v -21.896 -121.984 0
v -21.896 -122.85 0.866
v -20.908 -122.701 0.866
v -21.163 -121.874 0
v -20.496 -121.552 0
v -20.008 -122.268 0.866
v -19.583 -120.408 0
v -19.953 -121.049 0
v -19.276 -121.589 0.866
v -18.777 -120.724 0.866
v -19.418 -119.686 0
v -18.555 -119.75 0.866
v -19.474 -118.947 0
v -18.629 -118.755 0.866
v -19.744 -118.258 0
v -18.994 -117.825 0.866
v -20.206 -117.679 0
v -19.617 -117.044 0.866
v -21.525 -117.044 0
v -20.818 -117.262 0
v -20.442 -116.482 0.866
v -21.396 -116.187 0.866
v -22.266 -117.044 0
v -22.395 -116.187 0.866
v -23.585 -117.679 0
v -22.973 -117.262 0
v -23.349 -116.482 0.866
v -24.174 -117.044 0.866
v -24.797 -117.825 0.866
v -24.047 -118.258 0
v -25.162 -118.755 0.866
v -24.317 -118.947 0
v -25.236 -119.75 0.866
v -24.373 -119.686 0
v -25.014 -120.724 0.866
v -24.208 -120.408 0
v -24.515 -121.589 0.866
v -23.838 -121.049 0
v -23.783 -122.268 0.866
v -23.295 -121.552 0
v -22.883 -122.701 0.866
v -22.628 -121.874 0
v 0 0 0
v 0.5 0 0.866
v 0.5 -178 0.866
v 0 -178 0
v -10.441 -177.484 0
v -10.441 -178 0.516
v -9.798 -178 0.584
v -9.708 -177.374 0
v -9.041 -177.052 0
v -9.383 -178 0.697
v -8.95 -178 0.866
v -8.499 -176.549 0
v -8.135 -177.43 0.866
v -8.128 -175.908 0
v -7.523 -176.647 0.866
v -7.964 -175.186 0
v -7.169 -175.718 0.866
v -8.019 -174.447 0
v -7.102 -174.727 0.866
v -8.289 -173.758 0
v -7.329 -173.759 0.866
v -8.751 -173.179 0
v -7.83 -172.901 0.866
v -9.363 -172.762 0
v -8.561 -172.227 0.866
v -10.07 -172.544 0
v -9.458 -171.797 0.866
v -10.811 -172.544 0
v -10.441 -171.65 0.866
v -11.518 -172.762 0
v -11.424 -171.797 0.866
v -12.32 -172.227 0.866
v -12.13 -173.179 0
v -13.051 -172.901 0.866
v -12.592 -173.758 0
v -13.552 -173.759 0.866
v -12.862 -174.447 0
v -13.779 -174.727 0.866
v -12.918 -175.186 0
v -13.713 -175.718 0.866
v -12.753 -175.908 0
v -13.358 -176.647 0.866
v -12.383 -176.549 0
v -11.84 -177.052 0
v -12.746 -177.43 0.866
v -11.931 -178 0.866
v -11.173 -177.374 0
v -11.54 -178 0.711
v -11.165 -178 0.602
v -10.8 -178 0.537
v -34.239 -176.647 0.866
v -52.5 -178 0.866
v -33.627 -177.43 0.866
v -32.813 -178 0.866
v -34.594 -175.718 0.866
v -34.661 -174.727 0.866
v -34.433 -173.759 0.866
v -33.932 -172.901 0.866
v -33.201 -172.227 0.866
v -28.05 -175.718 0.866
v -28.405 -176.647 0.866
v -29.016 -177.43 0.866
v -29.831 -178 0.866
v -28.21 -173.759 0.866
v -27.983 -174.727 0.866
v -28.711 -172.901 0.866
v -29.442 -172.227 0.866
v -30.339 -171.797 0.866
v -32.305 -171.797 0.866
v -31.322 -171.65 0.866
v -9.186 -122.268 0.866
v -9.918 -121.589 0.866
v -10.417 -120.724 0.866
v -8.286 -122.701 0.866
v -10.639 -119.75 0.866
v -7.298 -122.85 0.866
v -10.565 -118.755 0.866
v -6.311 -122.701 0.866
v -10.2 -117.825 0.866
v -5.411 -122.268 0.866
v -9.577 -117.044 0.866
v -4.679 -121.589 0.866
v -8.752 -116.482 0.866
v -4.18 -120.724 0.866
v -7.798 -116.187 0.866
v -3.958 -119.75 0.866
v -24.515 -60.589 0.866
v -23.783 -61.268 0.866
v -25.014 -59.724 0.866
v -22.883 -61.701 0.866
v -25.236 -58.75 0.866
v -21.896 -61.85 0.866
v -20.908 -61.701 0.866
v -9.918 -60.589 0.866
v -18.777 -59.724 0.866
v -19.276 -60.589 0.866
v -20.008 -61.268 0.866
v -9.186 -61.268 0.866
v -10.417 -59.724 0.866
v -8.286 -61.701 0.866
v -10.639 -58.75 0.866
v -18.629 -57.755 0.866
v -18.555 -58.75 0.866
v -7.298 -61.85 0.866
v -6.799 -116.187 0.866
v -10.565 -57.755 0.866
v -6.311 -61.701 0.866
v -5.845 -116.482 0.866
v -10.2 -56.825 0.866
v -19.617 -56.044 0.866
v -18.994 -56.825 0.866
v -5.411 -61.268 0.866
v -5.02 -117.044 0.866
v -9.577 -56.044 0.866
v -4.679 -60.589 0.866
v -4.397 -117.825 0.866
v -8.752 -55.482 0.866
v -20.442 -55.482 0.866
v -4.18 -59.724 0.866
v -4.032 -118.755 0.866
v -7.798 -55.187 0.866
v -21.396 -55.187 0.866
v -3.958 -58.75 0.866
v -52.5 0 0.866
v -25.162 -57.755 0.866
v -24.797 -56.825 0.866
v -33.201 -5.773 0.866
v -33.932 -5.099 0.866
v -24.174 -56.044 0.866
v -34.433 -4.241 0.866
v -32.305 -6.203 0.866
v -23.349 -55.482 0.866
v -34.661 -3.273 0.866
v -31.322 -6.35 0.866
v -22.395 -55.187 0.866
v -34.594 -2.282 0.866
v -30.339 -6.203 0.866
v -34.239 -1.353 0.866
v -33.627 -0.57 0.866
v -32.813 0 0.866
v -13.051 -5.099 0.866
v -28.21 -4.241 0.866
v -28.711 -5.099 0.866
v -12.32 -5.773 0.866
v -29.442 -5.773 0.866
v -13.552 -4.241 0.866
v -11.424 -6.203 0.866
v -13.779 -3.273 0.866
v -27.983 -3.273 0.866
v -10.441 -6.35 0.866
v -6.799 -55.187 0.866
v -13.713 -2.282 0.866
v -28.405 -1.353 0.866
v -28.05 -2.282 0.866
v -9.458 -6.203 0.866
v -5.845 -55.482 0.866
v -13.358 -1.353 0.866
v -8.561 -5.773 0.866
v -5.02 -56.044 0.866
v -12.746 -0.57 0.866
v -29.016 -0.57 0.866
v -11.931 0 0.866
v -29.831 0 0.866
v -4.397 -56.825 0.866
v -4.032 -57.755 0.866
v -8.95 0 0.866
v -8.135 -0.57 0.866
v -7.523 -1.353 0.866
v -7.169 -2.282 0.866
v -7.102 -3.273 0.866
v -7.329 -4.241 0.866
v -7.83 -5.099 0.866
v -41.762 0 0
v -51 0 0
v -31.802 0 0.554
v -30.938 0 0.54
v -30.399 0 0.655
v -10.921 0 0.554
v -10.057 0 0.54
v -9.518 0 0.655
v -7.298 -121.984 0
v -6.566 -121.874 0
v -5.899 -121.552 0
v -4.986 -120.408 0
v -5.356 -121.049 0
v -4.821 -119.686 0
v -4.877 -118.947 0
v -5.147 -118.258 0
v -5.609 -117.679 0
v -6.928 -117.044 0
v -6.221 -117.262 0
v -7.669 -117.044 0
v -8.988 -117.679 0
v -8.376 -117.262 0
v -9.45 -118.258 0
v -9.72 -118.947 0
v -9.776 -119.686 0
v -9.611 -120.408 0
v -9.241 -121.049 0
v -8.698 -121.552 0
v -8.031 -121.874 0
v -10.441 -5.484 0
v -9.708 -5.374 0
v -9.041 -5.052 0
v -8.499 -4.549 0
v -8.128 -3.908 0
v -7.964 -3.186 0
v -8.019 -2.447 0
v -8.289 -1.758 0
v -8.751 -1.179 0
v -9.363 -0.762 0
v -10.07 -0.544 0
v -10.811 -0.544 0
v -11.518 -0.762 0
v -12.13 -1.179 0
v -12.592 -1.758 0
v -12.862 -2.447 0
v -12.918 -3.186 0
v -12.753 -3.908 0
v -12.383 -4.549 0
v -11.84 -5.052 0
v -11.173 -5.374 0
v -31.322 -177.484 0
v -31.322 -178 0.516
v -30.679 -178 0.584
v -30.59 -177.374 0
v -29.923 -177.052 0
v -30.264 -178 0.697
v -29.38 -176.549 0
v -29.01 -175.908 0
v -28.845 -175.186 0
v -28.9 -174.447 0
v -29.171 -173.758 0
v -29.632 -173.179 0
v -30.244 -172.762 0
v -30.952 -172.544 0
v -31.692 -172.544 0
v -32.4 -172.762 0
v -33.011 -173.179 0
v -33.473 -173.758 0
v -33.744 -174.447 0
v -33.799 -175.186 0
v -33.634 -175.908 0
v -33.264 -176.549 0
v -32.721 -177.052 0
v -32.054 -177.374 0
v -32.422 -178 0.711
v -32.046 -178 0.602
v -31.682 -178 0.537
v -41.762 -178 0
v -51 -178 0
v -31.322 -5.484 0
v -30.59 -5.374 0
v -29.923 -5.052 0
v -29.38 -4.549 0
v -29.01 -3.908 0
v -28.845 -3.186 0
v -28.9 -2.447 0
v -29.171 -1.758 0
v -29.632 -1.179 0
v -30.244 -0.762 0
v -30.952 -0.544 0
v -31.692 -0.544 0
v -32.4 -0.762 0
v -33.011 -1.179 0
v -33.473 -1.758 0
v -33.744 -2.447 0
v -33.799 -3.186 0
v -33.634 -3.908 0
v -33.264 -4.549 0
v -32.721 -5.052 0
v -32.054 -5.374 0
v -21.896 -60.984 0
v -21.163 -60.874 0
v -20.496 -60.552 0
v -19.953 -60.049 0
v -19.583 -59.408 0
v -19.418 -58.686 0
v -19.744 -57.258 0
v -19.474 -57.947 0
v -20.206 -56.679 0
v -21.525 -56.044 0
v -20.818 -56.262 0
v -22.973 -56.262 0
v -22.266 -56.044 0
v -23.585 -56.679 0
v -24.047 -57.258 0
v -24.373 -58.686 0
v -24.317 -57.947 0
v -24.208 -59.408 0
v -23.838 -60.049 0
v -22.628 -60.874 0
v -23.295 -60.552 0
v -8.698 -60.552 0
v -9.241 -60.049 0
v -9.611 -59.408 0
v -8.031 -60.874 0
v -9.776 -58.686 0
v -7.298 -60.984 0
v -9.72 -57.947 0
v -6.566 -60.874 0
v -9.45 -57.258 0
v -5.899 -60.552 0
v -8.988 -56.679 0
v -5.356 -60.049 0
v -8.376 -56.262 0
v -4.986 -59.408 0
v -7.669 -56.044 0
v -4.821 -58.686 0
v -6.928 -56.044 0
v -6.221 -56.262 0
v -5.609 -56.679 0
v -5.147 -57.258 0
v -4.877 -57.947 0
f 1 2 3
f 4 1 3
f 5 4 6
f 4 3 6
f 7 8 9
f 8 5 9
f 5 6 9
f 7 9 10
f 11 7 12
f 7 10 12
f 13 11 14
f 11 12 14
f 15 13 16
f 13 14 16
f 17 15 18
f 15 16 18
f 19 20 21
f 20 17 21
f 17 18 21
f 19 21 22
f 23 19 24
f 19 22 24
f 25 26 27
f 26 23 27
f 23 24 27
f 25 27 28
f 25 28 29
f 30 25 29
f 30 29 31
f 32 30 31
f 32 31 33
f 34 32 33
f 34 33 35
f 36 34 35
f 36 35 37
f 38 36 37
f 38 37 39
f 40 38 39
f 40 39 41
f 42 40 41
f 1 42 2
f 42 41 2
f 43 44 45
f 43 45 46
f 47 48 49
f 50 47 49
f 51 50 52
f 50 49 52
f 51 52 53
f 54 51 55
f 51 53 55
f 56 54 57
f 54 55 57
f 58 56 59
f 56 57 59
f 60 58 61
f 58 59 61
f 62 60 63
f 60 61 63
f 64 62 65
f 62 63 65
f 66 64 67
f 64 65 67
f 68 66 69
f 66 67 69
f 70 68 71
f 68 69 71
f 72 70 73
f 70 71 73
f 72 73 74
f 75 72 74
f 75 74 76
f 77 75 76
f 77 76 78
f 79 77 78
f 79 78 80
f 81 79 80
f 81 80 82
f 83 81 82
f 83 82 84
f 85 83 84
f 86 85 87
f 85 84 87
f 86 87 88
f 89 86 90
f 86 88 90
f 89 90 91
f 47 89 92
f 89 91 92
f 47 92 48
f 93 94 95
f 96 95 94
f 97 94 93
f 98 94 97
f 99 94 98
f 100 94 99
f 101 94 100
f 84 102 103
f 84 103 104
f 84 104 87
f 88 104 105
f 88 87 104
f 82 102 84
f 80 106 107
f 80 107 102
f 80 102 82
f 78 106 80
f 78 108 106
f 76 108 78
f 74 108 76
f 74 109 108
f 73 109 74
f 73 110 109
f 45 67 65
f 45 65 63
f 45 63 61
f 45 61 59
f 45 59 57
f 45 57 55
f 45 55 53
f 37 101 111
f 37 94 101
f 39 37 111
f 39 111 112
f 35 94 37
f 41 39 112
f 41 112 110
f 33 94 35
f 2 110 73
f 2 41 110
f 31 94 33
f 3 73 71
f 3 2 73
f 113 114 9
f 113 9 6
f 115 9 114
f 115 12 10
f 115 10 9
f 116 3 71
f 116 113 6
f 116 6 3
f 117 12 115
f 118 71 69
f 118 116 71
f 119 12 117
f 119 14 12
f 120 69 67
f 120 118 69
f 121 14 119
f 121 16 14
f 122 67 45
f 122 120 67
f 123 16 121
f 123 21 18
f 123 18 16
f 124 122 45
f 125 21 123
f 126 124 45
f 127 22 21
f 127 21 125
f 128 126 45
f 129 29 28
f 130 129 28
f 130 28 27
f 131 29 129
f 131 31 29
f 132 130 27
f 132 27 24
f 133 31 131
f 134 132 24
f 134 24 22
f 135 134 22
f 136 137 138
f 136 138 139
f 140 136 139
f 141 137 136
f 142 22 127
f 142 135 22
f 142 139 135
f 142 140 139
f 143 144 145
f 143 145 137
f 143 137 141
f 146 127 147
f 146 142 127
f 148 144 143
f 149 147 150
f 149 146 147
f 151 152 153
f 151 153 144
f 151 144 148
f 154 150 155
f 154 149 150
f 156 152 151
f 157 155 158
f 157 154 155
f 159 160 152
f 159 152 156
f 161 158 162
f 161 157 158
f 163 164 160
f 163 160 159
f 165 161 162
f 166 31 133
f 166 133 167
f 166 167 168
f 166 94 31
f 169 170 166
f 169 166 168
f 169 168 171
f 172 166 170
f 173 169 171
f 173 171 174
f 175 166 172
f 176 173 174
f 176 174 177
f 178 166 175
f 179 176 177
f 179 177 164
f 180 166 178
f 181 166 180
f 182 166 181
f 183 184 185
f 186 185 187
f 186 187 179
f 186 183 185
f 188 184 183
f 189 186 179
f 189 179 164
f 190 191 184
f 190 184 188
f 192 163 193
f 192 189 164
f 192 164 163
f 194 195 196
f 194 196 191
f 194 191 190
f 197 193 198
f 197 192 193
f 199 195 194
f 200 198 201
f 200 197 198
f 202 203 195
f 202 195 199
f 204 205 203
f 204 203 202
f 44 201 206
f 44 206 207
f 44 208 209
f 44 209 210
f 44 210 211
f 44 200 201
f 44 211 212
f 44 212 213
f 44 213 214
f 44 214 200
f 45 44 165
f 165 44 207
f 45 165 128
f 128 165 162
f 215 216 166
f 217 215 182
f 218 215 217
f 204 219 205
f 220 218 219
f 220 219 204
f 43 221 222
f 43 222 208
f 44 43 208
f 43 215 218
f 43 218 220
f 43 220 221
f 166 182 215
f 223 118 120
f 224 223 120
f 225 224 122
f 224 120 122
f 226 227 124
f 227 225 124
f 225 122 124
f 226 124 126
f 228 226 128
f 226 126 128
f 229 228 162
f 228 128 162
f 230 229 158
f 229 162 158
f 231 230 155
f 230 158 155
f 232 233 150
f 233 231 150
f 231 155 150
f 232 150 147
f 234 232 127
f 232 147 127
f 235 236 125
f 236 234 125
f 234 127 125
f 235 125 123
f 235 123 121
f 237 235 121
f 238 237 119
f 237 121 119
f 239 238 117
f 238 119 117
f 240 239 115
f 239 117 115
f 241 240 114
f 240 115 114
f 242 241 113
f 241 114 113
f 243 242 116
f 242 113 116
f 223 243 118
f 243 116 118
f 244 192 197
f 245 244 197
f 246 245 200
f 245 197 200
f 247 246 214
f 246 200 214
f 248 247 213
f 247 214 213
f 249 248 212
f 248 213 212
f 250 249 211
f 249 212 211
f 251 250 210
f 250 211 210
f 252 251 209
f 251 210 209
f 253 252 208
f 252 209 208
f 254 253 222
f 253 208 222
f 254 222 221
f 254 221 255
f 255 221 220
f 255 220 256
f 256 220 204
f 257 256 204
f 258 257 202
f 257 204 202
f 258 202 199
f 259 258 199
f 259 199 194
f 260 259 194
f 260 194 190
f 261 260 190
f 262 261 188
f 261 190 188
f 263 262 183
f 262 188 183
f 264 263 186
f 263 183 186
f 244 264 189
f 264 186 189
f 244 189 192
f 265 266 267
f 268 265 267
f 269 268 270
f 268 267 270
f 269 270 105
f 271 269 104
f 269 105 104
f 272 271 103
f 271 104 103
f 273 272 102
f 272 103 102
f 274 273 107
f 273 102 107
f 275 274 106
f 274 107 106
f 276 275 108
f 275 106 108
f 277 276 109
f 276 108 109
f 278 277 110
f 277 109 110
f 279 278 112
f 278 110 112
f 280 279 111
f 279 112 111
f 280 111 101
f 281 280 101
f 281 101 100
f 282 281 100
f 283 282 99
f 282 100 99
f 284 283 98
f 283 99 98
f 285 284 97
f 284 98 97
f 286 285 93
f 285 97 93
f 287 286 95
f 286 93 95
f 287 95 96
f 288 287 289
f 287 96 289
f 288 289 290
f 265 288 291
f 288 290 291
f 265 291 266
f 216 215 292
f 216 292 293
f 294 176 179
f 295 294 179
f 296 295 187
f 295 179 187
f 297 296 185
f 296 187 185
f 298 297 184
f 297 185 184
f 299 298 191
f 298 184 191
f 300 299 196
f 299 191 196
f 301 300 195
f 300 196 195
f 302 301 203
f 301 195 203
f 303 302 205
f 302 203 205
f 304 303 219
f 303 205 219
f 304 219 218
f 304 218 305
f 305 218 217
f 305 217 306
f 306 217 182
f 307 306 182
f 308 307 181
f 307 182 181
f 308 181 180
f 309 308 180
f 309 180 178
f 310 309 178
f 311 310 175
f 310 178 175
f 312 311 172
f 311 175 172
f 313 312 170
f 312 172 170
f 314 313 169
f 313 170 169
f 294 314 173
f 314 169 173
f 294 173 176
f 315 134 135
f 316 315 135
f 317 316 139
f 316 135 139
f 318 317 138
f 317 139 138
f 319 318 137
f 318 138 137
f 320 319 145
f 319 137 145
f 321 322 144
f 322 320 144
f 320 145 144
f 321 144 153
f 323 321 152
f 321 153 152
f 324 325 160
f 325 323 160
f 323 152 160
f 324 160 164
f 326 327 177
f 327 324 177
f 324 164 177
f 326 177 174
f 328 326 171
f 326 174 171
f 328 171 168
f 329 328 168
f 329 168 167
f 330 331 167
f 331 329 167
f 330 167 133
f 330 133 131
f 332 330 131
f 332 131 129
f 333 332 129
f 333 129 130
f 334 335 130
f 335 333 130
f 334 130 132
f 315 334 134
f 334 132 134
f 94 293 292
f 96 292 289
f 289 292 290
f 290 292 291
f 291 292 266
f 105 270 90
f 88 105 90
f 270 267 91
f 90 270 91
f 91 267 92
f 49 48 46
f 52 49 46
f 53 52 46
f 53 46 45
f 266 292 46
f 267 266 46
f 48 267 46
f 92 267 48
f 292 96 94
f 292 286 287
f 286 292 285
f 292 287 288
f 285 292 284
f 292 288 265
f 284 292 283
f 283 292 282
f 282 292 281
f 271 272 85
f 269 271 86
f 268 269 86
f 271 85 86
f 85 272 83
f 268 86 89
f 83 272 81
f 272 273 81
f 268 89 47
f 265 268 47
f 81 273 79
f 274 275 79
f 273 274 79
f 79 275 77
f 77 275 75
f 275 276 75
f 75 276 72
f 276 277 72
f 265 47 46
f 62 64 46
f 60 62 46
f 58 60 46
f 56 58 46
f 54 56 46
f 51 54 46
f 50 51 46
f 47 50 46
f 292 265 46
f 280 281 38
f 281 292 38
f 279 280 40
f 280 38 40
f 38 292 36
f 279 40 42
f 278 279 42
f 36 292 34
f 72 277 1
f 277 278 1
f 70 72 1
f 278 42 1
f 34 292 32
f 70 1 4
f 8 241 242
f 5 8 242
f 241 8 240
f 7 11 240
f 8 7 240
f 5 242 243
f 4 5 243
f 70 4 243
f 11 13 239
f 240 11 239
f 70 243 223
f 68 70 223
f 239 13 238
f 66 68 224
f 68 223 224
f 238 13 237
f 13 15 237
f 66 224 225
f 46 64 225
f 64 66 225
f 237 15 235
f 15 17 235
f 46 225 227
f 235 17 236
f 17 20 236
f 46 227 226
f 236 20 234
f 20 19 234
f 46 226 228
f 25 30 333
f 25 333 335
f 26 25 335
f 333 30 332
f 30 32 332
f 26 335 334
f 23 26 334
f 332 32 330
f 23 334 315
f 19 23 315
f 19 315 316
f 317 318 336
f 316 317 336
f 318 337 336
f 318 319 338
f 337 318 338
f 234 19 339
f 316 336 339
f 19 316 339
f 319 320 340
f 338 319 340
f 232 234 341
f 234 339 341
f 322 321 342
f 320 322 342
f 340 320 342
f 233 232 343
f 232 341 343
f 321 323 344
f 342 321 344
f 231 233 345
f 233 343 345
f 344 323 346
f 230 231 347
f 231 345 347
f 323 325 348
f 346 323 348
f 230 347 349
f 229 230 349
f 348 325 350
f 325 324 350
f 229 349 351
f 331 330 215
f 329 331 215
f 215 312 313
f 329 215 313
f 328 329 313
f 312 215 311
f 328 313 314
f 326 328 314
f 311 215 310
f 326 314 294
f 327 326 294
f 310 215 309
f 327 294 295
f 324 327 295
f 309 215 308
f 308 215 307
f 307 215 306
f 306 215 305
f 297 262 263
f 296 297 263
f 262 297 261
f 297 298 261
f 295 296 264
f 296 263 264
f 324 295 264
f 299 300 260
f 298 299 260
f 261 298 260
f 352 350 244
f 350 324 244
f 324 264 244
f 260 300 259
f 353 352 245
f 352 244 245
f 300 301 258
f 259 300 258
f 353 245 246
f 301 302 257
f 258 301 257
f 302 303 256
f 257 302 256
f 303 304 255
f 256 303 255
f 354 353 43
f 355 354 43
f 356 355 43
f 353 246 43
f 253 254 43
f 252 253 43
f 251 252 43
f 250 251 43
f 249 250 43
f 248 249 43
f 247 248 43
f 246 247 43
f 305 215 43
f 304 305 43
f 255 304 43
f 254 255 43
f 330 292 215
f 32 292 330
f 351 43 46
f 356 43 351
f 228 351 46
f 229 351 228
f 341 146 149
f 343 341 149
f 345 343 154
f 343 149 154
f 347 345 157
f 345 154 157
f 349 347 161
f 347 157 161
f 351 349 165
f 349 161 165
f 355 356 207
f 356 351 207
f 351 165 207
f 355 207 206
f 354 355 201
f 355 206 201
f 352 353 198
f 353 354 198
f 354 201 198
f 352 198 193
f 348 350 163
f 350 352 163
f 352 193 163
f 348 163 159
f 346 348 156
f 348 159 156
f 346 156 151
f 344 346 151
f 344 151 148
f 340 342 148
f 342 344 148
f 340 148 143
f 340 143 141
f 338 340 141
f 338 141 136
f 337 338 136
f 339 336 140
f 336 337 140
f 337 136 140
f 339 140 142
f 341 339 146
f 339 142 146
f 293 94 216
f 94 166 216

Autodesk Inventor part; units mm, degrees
ref_plane "YZ Plane" through (0, 0, 0) normal (1, 0, 0) x (0, 1, 0)
ref_plane "Work Plane1" through (14.6553, 0, -25.7817) normal (0, 1, 0) x (-0.8660254, 0, 0.5)
ref_plane "Work Plane2" through (-53.25, -178, -67.8971) normal (0, -1, 0) x (0.8660254, 0, -0.5)
ref_plane "Work Plane3" through (14.6553, 0, -25.7817) normal (0, 1, 0) x (-0.8660254, 0, 0.5)
ref_plane "Work Plane4" through (-55.7811, 0, -1.2811) normal (0, 1, 0) x (0.5, 0, 0.8660254)
sketch "Sketch4" plane through (-55.7811, 0, -1.2811) normal (0, 1, 0) x (0.5, 0, 0.8660254)
  line L0 (3.5, 3.5) -> (-1, 3.5) projected
  line L1 (-1, 3.5) -> (-1, -0.5) projected
  line L2 (-1, -0.5) -> (-4.5, -0.5) projected
  line L3 (-4.5, -0.5) -> (-4.5, -14.5) projected
  line L4 (-4.5, -14.5) -> (4.5, -0.5) projected
  line L5 (4.5, -0.5) -> (3.5, -0.5) projected
  line L6 (3.5, -0.5) -> (3.5, 3.5) projected
  line L7 (8.1188, 11.5) -> (29, 47.6673) projected
  line L8 (29, 47.6673) -> (3.5, 3.5)
  line L9 (3.5, 1.7679) -> (30, 47.6673)
  line L10 (30, 47.6673) -> (29, 47.6673)
  point P0 (29, 47.6673)
  dimension "d10" = 1
ref_plane "Work Plane5" through (-46.3218, -178, -67.8971) normal (0, -1, 0) x (0.8660254, 0, -0.5)
extrude "Extrusion2" add sketch "Sketch4" against normal up to surface (178 mm away) contours L8 L7 L10 L9 L6
sketch "Sketch5" plane through (-52.5, 0, 0.866) normal (0, 0, 1) x (1, 0, 0)
  circle A0 centre (42.0594, -3) radius 2.3 projected
  circle A1 centre (21.1782, -3) radius 2.3 projected
  circle A2 centre (30.6045, -58.5) radius 2.3 projected
  circle A3 centre (45.2015, -58.5) radius 2.3 projected
  circle A4 centre (30.6045, -119.5) radius 2.3 projected
  circle A5 centre (45.2015, -119.5) radius 2.3 projected
  circle A6 centre (21.1782, -175) radius 2.3 projected
  circle A7 centre (42.0594, -175) radius 2.3 projected
  point P0 (52.5, 0)
hole "Hole2" at (-10.4406, -3, 0.866) at (-31.3218, -3, 0.866) at (-7.2985, -58.5, 0.866) at (-21.8955, -58.5, 0.866) at (-7.2985, -119.5, 0.866) at (-21.8955, -119.5, 0.866) at (-31.3218, -175, 0.866) at (-10.4406, -175, 0.866) direction (0, 0, -1) diameter 3.6 end through all countersink diameter 6.7 countersink angle 90 clearance for "Countersunk Flat Head Screw ISO 2009/7046" size "M3" standard "ISO"
properties part number "frobt" material "Nylon 6/6"
